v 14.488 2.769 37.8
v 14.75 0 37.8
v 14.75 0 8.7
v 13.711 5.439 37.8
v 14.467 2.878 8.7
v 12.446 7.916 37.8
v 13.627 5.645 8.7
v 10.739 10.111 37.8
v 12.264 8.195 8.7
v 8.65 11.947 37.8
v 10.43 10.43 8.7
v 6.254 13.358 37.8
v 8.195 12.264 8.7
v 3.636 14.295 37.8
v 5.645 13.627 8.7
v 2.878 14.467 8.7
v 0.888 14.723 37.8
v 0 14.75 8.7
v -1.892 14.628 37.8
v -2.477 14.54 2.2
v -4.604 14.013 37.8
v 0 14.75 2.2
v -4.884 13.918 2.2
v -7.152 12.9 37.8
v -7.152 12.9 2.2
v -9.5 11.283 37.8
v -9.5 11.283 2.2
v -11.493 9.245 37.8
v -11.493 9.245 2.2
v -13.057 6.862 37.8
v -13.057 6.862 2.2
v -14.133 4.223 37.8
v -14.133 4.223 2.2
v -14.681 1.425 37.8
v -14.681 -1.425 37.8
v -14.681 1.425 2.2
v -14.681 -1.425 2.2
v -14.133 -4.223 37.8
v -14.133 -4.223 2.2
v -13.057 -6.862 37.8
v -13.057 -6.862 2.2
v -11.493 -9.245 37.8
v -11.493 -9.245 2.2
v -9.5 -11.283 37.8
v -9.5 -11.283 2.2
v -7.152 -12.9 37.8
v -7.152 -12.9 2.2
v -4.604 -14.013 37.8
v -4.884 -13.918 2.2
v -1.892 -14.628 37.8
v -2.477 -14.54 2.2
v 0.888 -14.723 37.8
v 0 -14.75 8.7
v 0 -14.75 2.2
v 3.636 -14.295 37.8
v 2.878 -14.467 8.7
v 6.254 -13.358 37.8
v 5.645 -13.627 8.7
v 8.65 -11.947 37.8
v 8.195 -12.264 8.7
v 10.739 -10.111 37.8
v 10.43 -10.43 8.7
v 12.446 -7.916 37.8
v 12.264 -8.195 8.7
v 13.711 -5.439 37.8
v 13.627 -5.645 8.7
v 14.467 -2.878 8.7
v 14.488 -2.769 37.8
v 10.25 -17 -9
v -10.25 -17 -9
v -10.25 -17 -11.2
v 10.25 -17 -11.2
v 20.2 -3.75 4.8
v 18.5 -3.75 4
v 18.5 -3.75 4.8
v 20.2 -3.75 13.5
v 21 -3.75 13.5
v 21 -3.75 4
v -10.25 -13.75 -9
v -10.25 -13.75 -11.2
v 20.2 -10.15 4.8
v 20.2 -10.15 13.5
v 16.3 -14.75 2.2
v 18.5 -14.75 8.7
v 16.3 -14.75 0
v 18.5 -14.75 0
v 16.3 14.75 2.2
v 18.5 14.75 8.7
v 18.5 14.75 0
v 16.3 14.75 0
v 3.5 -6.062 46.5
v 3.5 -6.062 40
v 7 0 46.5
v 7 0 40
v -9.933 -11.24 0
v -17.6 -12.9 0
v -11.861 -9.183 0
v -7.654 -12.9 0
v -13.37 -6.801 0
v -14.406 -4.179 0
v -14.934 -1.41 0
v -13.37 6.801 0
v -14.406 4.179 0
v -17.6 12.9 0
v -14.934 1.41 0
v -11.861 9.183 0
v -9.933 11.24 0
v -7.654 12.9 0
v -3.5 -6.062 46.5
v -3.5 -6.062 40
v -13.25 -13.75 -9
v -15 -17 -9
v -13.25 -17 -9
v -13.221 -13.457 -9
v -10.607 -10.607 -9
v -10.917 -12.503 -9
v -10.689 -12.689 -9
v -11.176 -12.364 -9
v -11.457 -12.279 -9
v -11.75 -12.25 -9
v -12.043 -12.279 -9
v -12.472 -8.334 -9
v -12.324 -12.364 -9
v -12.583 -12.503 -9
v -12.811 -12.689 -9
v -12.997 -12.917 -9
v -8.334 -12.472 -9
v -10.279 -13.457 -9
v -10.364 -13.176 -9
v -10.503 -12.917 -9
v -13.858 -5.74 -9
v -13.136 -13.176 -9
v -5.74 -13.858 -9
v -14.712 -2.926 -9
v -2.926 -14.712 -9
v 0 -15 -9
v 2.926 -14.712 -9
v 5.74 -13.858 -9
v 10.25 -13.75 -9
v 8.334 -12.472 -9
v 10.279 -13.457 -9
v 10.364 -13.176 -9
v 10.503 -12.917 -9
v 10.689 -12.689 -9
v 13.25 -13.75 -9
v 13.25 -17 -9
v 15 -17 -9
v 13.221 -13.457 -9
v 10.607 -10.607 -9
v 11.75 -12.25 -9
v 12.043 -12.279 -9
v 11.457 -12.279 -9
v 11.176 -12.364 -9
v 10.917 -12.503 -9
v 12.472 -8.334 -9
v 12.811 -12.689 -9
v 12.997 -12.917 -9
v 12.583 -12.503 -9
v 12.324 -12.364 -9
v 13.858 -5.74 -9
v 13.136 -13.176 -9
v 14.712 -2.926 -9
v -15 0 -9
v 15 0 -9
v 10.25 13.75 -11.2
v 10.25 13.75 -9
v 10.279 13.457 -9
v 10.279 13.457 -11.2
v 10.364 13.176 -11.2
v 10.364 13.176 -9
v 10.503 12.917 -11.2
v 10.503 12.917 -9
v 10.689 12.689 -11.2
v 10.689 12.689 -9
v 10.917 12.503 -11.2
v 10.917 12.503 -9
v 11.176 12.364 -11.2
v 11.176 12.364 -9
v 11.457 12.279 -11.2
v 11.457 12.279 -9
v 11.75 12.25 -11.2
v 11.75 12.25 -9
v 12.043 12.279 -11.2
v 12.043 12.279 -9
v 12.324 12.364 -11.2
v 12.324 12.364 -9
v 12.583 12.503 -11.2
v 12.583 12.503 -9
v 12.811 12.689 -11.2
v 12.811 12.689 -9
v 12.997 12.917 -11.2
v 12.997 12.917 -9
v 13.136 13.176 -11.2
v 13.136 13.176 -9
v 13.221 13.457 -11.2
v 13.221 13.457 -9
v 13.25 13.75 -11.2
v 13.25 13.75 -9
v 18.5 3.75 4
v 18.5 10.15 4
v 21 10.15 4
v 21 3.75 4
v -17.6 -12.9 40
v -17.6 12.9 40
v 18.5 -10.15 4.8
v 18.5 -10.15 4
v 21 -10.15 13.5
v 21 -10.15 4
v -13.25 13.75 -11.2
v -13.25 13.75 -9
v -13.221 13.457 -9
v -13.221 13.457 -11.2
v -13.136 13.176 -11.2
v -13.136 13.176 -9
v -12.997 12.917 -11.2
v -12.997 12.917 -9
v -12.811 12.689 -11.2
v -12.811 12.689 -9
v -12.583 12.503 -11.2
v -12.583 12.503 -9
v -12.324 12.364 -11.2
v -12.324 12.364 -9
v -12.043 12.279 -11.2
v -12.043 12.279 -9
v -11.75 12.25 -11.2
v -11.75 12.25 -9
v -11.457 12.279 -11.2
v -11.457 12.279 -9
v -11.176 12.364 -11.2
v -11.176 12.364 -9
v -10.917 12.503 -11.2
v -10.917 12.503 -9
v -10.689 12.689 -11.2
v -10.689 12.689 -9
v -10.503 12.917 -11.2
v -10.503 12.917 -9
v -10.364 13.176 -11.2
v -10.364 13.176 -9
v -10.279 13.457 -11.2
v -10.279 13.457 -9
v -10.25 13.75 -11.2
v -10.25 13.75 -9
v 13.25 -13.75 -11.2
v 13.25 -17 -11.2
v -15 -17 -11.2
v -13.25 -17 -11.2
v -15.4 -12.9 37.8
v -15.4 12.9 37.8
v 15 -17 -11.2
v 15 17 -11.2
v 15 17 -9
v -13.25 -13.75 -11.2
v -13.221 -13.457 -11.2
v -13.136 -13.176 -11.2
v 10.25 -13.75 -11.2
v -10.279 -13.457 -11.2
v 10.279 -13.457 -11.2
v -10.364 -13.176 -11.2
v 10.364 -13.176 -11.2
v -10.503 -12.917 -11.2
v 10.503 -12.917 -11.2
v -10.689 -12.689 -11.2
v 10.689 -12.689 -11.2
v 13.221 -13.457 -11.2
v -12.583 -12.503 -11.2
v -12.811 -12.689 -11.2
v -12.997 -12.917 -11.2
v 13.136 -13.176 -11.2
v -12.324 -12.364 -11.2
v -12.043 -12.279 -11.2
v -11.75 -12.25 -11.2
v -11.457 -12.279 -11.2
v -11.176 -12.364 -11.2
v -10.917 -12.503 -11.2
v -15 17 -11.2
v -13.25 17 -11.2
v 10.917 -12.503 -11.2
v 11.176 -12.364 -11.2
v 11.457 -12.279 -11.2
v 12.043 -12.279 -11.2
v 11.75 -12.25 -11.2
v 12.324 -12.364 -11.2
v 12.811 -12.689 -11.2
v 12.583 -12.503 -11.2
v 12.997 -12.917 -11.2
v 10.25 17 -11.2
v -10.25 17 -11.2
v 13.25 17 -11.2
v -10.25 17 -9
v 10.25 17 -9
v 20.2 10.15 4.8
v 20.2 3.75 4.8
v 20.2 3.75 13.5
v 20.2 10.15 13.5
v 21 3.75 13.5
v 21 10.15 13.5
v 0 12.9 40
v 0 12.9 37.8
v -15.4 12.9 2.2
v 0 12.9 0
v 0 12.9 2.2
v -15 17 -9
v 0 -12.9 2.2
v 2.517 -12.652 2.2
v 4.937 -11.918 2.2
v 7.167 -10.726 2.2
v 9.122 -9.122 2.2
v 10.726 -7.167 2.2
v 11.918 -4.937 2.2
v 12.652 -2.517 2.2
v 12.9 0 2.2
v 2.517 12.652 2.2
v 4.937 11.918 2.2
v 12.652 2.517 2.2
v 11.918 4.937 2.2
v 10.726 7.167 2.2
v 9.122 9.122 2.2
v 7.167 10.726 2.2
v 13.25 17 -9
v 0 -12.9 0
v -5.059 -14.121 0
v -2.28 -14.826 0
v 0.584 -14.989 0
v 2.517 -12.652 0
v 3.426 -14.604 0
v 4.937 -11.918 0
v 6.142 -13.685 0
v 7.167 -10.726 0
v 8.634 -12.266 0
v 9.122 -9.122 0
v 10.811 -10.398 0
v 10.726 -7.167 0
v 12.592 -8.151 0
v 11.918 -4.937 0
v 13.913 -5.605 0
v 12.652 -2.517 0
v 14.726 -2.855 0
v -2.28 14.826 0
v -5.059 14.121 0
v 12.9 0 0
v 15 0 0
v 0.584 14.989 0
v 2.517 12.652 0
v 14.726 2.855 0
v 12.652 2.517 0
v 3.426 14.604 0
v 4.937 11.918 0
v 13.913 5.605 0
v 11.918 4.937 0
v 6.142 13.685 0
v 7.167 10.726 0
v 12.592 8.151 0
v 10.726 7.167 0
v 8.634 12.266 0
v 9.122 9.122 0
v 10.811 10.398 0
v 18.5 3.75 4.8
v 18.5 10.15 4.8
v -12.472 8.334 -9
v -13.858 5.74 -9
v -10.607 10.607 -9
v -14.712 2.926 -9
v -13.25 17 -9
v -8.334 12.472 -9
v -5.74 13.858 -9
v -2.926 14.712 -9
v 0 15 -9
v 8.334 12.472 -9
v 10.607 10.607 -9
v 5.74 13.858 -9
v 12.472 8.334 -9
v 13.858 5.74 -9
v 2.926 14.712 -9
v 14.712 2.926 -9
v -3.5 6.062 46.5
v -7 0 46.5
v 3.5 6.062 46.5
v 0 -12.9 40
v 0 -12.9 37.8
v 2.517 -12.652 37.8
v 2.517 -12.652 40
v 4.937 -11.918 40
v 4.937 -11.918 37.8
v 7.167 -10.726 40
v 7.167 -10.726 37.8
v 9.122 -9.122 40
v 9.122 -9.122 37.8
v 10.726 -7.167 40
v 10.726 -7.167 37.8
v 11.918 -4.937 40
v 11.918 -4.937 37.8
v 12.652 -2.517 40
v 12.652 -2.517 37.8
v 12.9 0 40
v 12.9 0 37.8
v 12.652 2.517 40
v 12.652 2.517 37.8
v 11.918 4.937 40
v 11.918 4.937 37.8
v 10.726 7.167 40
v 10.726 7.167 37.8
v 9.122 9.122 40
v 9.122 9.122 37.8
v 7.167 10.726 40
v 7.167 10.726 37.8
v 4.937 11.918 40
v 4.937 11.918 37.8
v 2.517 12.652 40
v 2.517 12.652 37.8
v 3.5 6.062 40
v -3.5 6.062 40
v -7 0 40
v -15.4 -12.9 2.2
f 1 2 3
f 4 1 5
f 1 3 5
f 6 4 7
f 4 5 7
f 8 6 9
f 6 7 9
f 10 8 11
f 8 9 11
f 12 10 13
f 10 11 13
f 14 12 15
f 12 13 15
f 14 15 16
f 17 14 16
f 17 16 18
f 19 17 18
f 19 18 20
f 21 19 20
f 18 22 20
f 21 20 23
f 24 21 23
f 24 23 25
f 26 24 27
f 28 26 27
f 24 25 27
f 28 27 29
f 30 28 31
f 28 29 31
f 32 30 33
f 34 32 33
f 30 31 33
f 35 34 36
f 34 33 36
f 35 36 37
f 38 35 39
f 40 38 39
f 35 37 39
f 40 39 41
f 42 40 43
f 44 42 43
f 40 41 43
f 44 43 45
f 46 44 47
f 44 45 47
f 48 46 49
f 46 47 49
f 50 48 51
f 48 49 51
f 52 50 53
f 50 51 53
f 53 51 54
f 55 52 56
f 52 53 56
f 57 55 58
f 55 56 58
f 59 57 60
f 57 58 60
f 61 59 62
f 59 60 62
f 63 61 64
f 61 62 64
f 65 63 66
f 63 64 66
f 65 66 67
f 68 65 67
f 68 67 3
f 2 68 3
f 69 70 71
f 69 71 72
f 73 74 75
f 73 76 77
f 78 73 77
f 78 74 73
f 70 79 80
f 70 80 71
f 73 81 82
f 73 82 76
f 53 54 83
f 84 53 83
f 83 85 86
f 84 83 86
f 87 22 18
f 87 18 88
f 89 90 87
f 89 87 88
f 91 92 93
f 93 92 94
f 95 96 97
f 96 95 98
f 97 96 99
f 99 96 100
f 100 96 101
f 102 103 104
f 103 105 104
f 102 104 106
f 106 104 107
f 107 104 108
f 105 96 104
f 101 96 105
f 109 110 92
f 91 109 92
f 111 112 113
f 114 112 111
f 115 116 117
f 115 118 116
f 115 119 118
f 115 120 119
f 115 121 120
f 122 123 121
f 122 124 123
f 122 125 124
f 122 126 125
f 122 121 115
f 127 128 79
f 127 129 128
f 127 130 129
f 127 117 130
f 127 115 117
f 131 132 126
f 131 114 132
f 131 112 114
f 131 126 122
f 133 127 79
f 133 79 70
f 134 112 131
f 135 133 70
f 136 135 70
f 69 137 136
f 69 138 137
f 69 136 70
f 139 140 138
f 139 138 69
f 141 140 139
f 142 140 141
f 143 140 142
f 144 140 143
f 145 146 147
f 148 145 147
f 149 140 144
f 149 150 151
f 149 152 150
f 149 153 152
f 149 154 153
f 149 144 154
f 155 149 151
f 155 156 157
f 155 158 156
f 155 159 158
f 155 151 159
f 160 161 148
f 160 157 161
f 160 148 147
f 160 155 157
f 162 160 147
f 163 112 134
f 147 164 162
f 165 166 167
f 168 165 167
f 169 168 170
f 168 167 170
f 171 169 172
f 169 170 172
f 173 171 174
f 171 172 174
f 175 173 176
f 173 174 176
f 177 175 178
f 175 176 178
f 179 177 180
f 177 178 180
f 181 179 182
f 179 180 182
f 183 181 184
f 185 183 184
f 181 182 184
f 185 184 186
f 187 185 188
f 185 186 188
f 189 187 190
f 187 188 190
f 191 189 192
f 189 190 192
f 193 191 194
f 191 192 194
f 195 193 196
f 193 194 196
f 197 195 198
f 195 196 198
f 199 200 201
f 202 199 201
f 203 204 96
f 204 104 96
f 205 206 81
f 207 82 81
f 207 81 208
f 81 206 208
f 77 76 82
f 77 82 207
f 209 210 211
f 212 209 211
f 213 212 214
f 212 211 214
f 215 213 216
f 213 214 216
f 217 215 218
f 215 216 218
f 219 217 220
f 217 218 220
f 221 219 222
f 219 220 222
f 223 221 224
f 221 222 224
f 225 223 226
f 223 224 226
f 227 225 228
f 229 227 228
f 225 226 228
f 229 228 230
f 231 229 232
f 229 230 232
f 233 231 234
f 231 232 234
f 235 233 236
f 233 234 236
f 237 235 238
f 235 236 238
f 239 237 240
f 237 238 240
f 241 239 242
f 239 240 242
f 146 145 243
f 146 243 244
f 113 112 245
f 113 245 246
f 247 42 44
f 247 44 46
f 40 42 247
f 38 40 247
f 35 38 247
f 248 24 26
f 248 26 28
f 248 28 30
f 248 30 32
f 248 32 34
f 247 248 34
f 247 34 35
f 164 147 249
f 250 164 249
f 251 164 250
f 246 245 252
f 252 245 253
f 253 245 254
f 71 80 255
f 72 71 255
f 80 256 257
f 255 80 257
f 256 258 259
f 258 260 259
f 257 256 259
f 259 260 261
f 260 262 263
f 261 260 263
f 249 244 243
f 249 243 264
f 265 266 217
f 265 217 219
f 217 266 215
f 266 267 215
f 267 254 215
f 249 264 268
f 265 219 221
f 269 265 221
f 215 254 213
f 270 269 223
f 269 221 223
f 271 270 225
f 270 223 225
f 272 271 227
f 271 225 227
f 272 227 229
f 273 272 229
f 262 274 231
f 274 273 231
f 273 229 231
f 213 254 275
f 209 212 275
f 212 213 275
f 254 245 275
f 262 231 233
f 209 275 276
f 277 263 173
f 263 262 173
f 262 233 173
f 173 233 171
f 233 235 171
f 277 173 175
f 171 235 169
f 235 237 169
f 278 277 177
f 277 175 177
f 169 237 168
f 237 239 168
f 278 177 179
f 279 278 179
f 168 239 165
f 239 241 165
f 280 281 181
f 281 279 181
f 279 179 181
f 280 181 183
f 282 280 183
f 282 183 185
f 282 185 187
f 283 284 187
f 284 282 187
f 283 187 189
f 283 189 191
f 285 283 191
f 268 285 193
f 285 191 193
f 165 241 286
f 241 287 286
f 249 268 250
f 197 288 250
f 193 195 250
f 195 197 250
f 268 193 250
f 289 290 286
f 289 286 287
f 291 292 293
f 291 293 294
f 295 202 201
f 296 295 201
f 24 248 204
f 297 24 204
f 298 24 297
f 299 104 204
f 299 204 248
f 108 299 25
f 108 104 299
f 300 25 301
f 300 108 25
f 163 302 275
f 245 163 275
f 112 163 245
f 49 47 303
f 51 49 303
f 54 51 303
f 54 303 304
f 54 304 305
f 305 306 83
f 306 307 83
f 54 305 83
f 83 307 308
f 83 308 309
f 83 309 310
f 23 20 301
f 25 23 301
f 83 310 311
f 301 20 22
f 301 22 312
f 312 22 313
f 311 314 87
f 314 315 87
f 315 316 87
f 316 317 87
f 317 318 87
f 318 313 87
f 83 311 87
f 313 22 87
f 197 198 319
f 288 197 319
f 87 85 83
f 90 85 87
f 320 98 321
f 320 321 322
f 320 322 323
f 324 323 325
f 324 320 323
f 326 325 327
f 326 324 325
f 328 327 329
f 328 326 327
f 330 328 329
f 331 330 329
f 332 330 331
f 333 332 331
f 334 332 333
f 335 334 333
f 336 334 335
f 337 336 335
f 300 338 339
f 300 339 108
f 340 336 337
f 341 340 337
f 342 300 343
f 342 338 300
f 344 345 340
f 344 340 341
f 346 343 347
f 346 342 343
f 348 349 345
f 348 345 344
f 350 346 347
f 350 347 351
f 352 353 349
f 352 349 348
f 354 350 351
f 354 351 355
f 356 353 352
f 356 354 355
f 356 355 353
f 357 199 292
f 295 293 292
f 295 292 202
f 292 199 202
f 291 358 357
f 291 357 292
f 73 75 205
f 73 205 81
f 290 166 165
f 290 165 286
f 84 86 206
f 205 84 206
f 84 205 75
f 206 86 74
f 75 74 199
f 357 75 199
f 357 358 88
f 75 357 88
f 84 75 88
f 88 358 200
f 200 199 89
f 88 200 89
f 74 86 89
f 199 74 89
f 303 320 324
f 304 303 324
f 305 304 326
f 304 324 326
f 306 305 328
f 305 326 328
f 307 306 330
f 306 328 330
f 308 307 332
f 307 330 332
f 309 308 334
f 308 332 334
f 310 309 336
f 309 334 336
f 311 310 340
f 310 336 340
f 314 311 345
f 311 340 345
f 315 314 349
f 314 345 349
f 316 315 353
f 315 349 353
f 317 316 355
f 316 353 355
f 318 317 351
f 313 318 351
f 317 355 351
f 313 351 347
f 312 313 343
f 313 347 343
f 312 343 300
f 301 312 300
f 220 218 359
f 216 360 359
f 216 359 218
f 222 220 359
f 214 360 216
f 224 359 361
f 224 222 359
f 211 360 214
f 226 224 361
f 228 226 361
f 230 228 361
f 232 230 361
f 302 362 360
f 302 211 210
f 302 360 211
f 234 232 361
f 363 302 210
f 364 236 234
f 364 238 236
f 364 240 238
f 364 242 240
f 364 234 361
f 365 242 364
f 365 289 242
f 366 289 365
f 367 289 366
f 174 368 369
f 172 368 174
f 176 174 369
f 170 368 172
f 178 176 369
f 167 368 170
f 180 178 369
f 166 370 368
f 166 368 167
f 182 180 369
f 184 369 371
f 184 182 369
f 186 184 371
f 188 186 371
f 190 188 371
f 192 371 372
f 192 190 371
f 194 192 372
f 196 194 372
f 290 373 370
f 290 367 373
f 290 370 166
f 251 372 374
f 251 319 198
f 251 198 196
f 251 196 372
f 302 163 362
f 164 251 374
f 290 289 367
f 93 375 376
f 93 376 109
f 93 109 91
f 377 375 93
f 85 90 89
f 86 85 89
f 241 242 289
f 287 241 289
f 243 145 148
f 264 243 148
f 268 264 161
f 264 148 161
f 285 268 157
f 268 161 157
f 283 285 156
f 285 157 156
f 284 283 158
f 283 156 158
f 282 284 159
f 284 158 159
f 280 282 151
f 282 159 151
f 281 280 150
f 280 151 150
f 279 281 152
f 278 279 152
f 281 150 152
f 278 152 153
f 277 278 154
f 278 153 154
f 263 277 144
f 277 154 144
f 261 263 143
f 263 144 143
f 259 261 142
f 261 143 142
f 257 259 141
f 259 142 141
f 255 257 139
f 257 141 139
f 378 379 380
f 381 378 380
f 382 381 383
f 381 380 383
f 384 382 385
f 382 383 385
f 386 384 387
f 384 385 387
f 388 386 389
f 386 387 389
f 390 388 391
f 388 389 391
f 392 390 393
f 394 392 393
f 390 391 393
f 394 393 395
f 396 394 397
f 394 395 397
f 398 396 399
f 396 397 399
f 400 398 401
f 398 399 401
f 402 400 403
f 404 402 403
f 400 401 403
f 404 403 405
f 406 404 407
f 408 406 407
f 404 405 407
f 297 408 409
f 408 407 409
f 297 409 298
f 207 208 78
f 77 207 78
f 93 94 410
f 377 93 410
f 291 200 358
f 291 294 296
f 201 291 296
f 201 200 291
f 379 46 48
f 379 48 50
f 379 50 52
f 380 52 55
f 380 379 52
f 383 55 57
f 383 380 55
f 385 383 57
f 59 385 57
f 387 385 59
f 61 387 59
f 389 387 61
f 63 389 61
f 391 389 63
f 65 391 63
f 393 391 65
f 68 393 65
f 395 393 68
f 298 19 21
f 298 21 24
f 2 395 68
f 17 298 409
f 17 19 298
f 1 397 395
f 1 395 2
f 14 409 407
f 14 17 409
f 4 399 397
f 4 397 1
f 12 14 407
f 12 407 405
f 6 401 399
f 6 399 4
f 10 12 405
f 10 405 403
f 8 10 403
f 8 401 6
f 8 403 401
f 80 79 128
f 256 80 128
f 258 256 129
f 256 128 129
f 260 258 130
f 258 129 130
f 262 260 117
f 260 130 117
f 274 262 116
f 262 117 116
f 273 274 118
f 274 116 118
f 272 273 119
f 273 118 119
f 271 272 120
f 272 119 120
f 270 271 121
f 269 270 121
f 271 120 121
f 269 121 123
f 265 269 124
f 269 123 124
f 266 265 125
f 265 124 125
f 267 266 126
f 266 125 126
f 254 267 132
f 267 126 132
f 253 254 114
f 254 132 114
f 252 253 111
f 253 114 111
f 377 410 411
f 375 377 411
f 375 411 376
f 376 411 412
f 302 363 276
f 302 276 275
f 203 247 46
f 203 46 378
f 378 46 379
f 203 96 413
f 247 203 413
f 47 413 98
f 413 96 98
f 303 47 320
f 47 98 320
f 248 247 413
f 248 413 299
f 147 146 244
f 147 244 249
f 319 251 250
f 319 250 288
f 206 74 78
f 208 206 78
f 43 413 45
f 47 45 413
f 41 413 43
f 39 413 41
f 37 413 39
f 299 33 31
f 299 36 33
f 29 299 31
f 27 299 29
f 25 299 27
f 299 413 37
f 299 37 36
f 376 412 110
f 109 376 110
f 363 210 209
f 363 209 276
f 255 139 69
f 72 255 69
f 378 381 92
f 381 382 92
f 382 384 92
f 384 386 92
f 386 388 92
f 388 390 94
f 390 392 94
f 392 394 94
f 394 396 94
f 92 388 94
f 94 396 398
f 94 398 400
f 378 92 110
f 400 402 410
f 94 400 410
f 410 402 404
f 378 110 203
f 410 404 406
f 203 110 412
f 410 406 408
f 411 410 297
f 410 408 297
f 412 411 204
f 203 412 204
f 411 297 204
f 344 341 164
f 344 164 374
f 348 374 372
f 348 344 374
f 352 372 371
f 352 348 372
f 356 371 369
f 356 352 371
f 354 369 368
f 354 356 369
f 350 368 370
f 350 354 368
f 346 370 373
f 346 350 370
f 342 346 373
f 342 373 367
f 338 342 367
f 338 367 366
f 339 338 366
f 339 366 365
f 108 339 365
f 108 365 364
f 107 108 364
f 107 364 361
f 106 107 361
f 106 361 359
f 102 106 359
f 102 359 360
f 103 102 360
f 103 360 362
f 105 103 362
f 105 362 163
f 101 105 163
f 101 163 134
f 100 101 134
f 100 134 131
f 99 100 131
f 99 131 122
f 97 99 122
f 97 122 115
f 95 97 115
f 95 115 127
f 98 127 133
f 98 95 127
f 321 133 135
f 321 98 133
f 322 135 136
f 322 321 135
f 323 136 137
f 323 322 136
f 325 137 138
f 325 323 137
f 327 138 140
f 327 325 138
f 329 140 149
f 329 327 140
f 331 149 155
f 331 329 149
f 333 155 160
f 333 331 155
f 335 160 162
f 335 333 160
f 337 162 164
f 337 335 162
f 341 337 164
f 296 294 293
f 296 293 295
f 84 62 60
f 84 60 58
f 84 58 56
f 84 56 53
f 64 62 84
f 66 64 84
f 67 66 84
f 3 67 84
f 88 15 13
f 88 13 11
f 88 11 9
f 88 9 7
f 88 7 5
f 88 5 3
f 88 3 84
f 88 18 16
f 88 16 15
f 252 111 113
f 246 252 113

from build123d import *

# Parameters (mm, degrees)
PAD_DEPTH    = 2.2
SKETCH001_R  = 14.75
SKETCH001_W  = 2.2
SKETCH001_H  = 25.8
PAD001_DEPTH = 35.6
PAD002_DEPTH = 2.2
PAD003_DEPTH = 6.5
SKETCH004_R  = 15
PAD004_DEPTH = 9
PAD005_DEPTH = 2.2
SKETCH006_W  = 18.5
SKETCH006_H  = 29.5
PAD006_DEPTH = 6.5
SKETCH007_W  = 2.2
SKETCH007_H  = 29.5
PAD007_DEPTH = 2.2
SKETCH008_W  = 2.5
SKETCH008_H  = 6.4
PAD008_DEPTH = 0.8
SKETCH009_W  = 0.8
SKETCH009_H  = 6.4
PAD009_DEPTH = 9.5


with BuildPart() as part:
    # Sketch → Pad (new body)
    with BuildSketch(Plane.XY):
        with BuildLine():
            ThreePointArc((0, -12.9), (12.9, 0), (0, 12.9))
            Line((0, 12.9), (-17.6, 12.9))
            Line((-17.6, 12.9), (-17.6, -12.9))
            Line((0, -12.9), (-17.6, -12.9))
        make_face()
    extrude(amount=PAD_DEPTH)

    # Sketch001 → Pad001 (join)
    with BuildSketch(Plane.XY.offset(2.2)):
        Circle(SKETCH001_R)
        with Locations((-16.5, 0)):
            Rectangle(SKETCH001_W, SKETCH001_H)
    extrude(amount=PAD001_DEPTH)

    # Sketch002 → Pad002 (join)
    with BuildSketch(Plane.XY.offset(37.8)):
        with BuildLine():
            Line((-17.6, 12.9), (0, 12.9))
            ThreePointArc((0, -12.9), (12.9, 0), (0, 12.9))
            Line((-17.6, -12.9), (0, -12.9))
            Line((-17.6, 12.9), (-17.6, -12.9))
        make_face()
    extrude(amount=PAD002_DEPTH)

    # Sketch003 → Pad003 (join)
    with BuildSketch(Plane.XY.offset(40)):
        Polygon((3.5, 6.062178), (-3.5, 6.062178), (-7, 0), (-3.5, -6.062178), (3.5, -6.062178), (7, 0), align=None)
    extrude(amount=PAD003_DEPTH)

    # Sketch004 → Pad004 (join)
    with BuildSketch(Plane.XY):
        Circle(SKETCH004_R)
    extrude(amount=-PAD004_DEPTH)

    # Sketch005 → Pad005 (join)
    with BuildSketch(Plane.XY.offset(-9)):
        with BuildLine():
            Line((-15, 17), (-15, -16.999987))
            Line((-15, -16.999987), (-13.25, -16.999987))
            Line((-13.25, -13.749993), (-13.25, -16.999987))
            ThreePointArc((-10.25, -13.749993), (-11.75, -12.249993), (-13.25, -13.749993))
            Line((-10.25, -13.749993), (-10.25, -16.999987))
            Line((-10.25, -16.999987), (10.25, -16.999987))
            Line((10.25, -13.749993), (10.25, -16.999987))
            ThreePointArc((13.25, -13.749993), (11.75, -12.249993), (10.25, -13.749993))
            Line((13.25, -13.749993), (13.25, -16.999987))
            Line((13.25, -16.999987), (15, -17))
            Line((15, -17), (15, 17))
            Line((15, 17), (13.25, 17))
            Line((13.25, 13.750007), (13.25, 17))
            ThreePointArc((10.25, 13.750007), (11.75, 12.250007), (13.25, 13.750007))
            Line((10.25, 13.750007), (10.25, 17))
            Line((10.25, 17), (-10.25, 17))
            Line((-10.25, 13.750007), (-10.25, 17))
            ThreePointArc((-13.25, 13.750007), (-11.75, 12.250007), (-10.25, 13.750007))
            Line((-13.25, 13.750007), (-13.25, 17))
            Line((-13.25, 17), (-15, 17))
        make_face()
    extrude(amount=-PAD005_DEPTH)

    # Sketch006 → Pad006 (join)
    with BuildSketch(Plane.XY.offset(2.2)):
        with Locations((9.25, 0)):
            Rectangle(SKETCH006_W, SKETCH006_H)
    extrude(amount=PAD006_DEPTH)

    # Sketch007 → Pad007 (join)
    with BuildSketch(Plane.XY):
        with Locations((17.4, 0)):
            Rectangle(SKETCH007_W, SKETCH007_H)
    extrude(amount=PAD007_DEPTH)

    # Sketch008 → Pad008 (join)
    with BuildSketch(Plane.XY.offset(4)):
        with Locations((19.75, 6.95)):
            Rectangle(SKETCH008_W, SKETCH008_H)
        with Locations((19.75, -6.95)):
            Rectangle(SKETCH008_W, SKETCH008_H)
    extrude(amount=PAD008_DEPTH)

    # Sketch009 → Pad009 (join)
    with BuildSketch(Plane.XY.offset(4)):
        with Locations((20.6, 6.95)):
            Rectangle(SKETCH009_W, SKETCH009_H)
        with Locations((20.6, -6.95)):
            Rectangle(SKETCH009_W, SKETCH009_H)
    extrude(amount=PAD009_DEPTH)


solid = part.part
